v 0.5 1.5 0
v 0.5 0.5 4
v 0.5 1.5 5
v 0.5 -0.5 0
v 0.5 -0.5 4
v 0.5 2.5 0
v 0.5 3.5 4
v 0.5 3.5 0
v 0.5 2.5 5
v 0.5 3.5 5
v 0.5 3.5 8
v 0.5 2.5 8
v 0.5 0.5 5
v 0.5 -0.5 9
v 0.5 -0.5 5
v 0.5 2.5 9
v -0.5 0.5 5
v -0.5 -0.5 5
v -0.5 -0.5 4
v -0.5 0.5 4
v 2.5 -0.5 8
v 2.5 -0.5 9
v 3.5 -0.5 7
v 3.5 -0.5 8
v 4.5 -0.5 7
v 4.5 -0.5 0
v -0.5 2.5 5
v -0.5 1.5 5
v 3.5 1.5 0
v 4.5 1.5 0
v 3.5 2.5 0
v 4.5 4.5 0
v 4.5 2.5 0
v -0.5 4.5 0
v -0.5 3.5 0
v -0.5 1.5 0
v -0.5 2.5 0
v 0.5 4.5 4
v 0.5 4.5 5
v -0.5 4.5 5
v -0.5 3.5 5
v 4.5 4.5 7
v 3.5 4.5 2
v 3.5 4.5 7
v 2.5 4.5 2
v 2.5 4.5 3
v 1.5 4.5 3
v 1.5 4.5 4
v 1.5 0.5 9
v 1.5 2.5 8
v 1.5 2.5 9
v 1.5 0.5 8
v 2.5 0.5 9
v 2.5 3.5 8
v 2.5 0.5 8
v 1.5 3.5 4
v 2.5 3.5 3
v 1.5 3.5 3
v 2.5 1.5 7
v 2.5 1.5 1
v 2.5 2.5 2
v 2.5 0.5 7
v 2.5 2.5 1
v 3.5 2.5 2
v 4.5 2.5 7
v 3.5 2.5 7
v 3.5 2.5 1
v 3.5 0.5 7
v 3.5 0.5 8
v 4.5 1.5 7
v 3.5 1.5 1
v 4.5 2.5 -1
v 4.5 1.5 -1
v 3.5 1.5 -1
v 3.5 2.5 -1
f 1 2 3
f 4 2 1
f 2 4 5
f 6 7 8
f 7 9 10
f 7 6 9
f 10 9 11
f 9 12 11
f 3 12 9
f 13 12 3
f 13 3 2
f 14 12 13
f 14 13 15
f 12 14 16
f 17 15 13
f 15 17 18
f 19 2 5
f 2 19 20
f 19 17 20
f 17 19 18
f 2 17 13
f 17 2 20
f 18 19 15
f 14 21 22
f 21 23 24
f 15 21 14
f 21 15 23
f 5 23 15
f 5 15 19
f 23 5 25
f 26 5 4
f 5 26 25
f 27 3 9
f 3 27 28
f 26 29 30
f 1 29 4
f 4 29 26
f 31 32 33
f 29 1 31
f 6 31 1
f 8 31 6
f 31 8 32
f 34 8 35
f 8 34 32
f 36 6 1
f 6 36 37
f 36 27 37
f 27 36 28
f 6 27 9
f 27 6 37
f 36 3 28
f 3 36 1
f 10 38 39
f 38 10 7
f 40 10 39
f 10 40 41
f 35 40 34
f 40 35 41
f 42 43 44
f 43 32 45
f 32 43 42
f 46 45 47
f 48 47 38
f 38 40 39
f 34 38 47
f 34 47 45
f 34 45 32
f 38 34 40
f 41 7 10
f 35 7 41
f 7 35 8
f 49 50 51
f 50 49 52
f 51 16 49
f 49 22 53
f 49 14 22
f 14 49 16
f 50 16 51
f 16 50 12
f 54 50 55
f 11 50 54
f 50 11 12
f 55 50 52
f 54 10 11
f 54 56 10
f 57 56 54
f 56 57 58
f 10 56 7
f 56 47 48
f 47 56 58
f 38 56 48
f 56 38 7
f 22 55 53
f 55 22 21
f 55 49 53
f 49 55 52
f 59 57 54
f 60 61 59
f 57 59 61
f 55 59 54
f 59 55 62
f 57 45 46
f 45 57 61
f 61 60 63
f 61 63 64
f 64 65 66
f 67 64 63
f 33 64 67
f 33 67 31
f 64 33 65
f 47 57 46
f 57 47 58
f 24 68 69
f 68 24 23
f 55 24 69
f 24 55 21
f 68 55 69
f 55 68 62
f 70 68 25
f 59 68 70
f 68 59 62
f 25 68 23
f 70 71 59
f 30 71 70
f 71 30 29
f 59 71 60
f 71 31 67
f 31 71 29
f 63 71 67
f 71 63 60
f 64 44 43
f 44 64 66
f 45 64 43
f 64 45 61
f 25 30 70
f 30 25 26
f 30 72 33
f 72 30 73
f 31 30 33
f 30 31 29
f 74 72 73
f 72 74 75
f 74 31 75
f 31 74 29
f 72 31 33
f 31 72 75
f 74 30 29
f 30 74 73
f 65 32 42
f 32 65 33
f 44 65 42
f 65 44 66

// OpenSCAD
union() {
    translate([0, 0, 4.5]) color([1, 0, 0]) cube([1, 1, 1], center=true);
    translate([0, 2, 2.5]) cube([1, 1, 5], center=true);
    translate([0, 4, 2.5]) cube([1, 1, 5], center=true);
    translate([1, 0, 4.5]) cube([1, 1, 9], center=true);
    translate([1, 1, 4.5]) cube([1, 1, 9], center=true);
    translate([1, 2, 4.5]) cube([1, 1, 9], center=true);
    translate([1, 3, 4.0]) cube([1, 1, 8], center=true);
    translate([1, 4, 2.0]) cube([1, 1, 4], center=true);
    translate([2, 0, 4.5]) cube([1, 1, 9], center=true);
    translate([2, 1, 4.0]) cube([1, 1, 8], center=true);
    translate([2, 2, 4.0]) cube([1, 1, 8], center=true);
    translate([2, 3, 4.0]) cube([1, 1, 8], center=true);
    translate([2, 4, 1.5]) cube([1, 1, 3], center=true);
    translate([3, 0, 4.0]) cube([1, 1, 8], center=true);
    translate([3, 1, 3.5]) cube([1, 1, 7], center=true);
    translate([3, 2, 0.5]) cube([1, 1, 1], center=true);
    translate([3, 3, 1.0]) cube([1, 1, 2], center=true);
    translate([3, 4, 1.0]) cube([1, 1, 2], center=true);
    translate([4, 0, 3.5]) cube([1, 1, 7], center=true);
    translate([4, 1, 3.5]) cube([1, 1, 7], center=true);
    translate([4, 2, -0.5]) color([0, 0, 1]) cube([1, 1, 1], center=true);
    translate([4, 3, 3.5]) cube([1, 1, 7], center=true);
    translate([4, 4, 3.5]) cube([1, 1, 7], center=true);
}
